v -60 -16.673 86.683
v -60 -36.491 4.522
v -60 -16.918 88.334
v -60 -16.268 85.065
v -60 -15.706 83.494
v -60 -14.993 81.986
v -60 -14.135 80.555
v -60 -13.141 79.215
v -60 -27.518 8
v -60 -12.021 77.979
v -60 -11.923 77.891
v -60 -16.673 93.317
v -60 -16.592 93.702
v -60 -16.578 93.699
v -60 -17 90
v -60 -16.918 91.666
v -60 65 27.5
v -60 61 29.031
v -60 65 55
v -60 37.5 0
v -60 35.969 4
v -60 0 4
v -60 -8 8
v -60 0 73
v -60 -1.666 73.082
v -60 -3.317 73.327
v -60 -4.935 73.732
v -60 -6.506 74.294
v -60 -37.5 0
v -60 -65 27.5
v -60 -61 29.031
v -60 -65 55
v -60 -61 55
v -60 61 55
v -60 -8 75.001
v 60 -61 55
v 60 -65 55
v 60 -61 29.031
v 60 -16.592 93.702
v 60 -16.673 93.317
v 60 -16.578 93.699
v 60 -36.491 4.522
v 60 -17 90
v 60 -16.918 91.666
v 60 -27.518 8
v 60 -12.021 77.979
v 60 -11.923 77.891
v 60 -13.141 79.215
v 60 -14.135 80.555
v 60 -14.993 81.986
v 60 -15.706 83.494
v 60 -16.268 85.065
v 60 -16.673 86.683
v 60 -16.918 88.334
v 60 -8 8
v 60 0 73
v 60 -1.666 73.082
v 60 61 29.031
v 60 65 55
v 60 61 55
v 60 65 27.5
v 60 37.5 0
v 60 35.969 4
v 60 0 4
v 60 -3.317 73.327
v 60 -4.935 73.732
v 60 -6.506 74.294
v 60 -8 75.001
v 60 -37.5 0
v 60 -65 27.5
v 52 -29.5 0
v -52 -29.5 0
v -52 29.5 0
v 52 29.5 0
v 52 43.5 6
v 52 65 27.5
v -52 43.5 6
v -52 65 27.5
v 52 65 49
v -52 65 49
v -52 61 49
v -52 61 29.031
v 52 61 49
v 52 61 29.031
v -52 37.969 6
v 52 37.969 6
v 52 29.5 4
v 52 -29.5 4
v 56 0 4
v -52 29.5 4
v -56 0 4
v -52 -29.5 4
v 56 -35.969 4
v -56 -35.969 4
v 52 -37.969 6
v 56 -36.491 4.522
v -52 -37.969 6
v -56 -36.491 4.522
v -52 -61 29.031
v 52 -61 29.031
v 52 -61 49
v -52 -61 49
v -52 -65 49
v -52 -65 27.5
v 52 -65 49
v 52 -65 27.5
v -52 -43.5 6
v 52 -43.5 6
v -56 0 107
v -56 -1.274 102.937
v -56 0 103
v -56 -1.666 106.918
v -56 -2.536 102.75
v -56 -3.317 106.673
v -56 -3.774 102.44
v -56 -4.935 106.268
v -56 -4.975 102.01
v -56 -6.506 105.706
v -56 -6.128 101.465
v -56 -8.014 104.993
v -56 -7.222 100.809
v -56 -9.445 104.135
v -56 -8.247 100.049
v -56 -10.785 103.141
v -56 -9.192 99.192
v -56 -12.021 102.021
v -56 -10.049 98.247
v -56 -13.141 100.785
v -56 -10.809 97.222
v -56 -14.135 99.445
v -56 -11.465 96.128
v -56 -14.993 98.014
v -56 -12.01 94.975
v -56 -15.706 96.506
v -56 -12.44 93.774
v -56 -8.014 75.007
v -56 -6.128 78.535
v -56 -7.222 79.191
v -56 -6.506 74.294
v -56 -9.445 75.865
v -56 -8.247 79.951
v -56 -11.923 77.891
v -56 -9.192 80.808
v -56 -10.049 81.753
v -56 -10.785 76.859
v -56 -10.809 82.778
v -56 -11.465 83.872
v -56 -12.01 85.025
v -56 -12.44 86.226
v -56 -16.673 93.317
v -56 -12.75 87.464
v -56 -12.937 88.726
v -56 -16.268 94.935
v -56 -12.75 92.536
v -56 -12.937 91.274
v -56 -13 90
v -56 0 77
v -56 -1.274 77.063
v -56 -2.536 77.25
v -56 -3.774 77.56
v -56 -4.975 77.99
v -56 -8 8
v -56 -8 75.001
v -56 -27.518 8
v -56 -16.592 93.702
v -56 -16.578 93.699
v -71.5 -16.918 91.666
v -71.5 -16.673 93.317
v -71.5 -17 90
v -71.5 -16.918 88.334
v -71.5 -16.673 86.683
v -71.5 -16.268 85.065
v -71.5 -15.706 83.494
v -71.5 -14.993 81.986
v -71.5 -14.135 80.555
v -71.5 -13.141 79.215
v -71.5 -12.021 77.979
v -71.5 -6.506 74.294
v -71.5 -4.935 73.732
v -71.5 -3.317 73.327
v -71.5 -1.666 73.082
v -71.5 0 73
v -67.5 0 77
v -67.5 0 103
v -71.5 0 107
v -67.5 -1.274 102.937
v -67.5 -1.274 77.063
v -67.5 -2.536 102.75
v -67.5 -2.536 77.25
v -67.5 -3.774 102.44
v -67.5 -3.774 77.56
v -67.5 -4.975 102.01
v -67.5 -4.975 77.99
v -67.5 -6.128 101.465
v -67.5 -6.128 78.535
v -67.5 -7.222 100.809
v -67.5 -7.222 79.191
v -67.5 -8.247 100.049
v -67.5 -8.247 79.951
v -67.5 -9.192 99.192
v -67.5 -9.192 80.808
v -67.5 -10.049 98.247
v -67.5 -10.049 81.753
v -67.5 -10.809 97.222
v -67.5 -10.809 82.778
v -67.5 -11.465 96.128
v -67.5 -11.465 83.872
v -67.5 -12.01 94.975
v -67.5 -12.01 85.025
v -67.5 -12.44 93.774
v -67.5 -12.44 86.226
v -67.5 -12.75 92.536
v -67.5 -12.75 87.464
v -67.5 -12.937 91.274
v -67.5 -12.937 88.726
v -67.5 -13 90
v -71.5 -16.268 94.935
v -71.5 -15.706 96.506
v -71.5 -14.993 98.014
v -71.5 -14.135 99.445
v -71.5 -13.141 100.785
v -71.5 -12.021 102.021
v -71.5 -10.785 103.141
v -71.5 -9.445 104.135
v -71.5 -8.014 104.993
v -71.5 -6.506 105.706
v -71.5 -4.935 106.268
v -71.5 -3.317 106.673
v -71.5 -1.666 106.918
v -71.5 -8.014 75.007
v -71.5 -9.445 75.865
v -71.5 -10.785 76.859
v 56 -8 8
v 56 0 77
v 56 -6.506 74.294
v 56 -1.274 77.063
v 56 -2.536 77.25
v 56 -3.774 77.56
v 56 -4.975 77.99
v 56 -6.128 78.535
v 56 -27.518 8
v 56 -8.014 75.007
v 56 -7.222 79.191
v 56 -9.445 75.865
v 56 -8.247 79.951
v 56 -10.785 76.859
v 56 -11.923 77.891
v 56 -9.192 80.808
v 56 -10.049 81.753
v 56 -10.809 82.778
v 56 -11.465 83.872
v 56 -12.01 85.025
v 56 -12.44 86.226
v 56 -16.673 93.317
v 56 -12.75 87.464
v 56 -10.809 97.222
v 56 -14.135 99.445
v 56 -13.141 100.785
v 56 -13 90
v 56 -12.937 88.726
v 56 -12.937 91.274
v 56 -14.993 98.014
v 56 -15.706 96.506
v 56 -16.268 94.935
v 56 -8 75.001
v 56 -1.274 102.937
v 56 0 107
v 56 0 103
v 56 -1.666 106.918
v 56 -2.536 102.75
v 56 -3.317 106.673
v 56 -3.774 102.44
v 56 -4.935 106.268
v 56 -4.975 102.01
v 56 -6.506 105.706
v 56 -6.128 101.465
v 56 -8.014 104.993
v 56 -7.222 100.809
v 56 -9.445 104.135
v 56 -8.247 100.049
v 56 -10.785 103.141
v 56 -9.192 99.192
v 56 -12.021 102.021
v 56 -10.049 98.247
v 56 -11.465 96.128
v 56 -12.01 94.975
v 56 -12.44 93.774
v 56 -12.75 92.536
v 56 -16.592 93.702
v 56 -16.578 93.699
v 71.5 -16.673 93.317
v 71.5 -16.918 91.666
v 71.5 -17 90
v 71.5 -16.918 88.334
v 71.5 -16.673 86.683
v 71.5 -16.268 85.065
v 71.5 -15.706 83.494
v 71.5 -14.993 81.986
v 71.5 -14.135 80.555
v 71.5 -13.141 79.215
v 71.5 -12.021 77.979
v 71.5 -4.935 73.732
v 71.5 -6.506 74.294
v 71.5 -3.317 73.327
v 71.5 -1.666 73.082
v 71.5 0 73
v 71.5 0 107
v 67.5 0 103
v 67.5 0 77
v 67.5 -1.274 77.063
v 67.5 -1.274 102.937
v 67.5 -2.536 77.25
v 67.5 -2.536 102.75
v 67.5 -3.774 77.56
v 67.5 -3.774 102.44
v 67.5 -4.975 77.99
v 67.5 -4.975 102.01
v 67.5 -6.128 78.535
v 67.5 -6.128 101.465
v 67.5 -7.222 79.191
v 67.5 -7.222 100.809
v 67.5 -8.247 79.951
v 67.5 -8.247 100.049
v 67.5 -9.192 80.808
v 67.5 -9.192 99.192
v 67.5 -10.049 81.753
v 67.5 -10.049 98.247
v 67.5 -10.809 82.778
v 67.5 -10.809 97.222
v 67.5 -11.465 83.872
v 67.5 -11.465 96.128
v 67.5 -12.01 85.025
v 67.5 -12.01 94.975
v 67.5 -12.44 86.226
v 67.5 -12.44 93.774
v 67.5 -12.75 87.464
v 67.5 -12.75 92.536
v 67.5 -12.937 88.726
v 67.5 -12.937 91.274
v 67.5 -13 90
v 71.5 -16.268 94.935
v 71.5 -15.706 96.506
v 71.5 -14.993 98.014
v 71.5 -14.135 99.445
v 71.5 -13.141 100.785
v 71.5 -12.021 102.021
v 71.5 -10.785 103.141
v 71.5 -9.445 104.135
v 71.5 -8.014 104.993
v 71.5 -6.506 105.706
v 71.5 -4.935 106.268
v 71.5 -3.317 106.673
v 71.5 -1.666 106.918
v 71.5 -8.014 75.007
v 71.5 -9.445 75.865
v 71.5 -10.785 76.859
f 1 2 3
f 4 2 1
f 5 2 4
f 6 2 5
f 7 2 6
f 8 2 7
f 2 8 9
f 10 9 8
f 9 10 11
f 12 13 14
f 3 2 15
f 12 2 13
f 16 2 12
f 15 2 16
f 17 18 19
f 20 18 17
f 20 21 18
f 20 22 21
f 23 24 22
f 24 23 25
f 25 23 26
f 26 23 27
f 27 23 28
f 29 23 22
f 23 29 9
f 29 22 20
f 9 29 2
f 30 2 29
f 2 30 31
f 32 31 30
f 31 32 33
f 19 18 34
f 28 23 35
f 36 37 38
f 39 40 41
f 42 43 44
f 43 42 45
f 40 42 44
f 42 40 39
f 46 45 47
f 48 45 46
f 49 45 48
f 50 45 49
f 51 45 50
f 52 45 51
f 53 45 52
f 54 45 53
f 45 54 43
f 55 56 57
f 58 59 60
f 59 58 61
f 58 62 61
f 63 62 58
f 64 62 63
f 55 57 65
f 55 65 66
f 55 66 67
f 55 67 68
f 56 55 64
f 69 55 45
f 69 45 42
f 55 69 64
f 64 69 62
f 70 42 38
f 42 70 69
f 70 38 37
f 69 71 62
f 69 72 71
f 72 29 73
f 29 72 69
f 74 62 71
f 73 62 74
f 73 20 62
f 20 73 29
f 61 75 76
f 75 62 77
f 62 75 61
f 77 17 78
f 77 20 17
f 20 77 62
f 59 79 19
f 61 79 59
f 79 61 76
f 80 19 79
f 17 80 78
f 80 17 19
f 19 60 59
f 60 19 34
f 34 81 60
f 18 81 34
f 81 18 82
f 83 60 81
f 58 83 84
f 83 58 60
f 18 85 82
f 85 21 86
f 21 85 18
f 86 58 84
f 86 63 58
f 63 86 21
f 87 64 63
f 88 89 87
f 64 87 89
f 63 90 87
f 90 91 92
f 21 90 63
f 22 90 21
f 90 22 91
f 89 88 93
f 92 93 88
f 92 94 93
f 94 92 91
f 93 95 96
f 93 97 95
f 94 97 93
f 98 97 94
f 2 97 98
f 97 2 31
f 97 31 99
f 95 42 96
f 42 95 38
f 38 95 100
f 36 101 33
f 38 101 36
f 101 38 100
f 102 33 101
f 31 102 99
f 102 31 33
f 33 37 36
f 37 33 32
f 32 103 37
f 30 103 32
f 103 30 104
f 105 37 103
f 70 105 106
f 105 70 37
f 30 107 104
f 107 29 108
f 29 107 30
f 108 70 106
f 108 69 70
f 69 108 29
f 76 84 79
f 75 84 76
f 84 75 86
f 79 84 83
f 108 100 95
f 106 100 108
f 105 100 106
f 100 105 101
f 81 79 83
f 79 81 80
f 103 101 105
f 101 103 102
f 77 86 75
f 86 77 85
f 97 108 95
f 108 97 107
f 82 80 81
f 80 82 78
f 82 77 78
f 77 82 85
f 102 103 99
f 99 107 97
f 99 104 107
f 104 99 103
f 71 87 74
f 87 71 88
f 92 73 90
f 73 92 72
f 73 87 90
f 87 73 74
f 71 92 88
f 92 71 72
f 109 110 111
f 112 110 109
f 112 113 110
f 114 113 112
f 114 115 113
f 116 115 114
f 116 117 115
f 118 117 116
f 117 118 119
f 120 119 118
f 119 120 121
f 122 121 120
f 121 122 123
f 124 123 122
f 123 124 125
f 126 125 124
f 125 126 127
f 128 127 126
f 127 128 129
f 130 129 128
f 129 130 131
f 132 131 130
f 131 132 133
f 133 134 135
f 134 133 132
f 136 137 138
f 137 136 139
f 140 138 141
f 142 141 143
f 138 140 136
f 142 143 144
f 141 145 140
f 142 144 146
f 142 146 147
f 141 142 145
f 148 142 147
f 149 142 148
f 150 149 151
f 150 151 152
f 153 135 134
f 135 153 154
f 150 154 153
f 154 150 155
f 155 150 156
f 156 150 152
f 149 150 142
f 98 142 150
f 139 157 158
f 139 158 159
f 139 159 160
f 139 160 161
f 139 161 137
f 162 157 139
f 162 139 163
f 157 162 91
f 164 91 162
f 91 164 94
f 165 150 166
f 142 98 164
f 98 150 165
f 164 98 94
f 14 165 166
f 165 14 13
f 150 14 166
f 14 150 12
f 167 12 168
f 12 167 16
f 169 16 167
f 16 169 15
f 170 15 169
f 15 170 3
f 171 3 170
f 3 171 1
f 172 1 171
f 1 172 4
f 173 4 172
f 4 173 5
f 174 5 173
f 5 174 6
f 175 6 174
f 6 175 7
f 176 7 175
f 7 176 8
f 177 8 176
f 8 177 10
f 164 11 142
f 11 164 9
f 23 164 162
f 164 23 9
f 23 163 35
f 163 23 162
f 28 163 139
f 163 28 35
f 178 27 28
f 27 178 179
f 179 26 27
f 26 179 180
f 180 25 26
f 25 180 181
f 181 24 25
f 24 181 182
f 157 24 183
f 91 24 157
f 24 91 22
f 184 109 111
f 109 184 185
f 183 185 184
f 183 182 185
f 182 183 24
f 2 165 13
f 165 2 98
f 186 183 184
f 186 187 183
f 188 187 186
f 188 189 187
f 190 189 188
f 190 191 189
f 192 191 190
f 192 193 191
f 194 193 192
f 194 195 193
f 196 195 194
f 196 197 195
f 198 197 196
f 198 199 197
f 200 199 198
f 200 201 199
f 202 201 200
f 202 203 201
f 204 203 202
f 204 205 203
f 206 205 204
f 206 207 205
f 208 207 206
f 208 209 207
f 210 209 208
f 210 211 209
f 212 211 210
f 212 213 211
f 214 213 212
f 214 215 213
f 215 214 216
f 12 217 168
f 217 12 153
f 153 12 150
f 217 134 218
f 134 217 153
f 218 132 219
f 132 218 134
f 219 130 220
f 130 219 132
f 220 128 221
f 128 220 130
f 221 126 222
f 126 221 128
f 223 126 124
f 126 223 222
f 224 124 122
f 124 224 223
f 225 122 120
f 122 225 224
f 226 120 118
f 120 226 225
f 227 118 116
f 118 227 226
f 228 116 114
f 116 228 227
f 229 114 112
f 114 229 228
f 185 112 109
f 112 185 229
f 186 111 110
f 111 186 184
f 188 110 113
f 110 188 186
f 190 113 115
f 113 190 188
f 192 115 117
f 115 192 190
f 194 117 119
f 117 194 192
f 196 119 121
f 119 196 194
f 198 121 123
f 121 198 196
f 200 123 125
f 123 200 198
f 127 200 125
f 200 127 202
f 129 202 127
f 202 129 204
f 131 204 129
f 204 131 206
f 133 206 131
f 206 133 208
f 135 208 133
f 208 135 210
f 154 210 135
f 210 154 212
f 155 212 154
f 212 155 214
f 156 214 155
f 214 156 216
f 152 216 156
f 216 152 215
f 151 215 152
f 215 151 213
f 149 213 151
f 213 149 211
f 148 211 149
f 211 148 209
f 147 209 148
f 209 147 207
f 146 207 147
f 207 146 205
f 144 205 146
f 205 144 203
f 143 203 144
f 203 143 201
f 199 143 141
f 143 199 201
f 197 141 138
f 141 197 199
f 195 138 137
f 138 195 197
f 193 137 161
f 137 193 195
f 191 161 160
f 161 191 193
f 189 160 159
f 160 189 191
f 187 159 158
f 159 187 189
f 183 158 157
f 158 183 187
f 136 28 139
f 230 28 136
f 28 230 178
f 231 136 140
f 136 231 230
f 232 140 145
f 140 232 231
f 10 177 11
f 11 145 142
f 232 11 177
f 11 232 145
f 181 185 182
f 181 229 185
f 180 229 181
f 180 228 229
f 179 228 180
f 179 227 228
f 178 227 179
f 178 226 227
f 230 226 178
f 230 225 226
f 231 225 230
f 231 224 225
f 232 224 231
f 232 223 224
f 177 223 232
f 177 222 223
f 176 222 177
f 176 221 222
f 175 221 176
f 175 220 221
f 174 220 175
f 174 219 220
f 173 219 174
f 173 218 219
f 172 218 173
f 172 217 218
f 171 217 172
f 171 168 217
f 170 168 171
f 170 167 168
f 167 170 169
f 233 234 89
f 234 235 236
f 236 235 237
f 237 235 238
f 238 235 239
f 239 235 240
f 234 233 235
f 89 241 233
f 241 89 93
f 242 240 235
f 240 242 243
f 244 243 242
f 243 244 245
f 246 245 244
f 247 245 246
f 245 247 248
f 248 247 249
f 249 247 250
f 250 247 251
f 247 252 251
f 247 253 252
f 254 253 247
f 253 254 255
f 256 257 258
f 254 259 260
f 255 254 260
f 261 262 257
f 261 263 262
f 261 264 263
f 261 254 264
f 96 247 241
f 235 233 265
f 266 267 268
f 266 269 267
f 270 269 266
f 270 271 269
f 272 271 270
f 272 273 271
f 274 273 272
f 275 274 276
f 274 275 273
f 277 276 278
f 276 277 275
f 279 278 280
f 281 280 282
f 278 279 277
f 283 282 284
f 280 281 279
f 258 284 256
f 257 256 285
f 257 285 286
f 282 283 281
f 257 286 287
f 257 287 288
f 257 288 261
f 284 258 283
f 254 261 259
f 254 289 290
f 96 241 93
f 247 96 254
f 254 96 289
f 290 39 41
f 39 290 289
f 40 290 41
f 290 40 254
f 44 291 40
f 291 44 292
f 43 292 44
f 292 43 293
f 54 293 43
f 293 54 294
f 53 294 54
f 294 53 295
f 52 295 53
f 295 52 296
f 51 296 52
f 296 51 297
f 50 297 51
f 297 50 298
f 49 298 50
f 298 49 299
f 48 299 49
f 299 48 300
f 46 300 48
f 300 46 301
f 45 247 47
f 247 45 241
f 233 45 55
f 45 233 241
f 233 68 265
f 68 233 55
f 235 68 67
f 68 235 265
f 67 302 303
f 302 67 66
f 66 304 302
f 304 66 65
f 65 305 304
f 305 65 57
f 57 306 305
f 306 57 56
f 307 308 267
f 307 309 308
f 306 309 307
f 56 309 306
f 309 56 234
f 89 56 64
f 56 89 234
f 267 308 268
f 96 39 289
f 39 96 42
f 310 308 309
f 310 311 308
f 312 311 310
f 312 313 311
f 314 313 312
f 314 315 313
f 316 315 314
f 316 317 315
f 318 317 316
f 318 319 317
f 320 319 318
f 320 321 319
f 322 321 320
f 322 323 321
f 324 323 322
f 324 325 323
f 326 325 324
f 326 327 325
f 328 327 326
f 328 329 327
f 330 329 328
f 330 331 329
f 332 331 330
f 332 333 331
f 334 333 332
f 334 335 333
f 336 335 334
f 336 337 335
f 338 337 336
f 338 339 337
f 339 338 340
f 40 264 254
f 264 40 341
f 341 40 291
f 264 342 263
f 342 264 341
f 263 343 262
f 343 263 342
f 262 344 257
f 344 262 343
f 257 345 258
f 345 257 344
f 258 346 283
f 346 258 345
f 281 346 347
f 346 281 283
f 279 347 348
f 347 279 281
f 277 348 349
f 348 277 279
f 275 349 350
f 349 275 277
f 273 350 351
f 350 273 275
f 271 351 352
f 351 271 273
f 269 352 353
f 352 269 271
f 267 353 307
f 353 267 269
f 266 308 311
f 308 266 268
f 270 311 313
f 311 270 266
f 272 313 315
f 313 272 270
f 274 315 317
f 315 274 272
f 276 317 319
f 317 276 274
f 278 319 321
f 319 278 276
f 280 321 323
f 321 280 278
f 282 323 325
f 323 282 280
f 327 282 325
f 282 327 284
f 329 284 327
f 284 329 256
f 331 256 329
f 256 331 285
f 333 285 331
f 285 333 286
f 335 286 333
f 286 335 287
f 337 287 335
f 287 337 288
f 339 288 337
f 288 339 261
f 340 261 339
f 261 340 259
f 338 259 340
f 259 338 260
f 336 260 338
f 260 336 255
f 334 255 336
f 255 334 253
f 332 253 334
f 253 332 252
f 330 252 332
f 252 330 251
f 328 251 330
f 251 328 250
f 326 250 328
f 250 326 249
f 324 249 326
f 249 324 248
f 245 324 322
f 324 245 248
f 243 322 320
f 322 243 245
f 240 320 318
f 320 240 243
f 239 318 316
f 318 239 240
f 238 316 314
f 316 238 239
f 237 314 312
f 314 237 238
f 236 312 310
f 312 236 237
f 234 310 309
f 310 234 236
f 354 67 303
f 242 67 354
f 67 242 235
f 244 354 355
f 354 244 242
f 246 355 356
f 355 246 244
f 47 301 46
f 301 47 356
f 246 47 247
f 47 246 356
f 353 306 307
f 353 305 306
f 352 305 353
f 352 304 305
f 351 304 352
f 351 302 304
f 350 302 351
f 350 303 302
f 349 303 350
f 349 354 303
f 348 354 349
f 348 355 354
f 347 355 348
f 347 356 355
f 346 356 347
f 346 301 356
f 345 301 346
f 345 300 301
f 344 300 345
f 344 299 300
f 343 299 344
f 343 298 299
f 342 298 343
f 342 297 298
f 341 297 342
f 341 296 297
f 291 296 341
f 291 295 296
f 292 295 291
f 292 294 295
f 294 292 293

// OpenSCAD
/*
 * CC BY-NC 4.0
 * https://creativecommons.org/licenses/by-nc/4.0/
 *
 * Author: Kevin Lam (kevinlam@bbs2.hk)
 *
 */

/* setup */
part = "holder"; // [holder: Holder, bar: Bar holding the roll]

width = 120;
height = 130;

// excluding the arms
depth = 55;

// this affect the strength of the frame
thickness = 4;
// this affect the width at the sides of the frame
padding = 8;

// Distance from the bar to the back, i.e., arm length
bar_z = 90;

// this is the width of the bar holding the roll
bar_width = 135;    
bar_diameter = 26;  // diameter of bar


module back() {
    corner = thickness*cos(135/2);
    
    difference() {
        translate([-width/2,0,depth])
        rotate(90,[0,1,0])
        linear_extrude(width)
        polygon([
            [0,height/2],
            [depth/2, height/2],
            [depth, (height-depth)/2],
            [depth, -(height-depth)/2],
            [depth/2, -height/2],
            [0,-height/2],
            [0,-height/2+thickness],
            [depth/2-corner, -height/2+thickness],
            [depth-thickness, -(height-depth)/2+corner],
            [depth-thickness, (height-depth)/2-corner],
            [depth/2-corner, height/2-thickness],
            [0,height/2-thickness]
        ]);
        translate([0, 0, (depth-padding)/2+thickness])
            cube([width-padding*2,height*2,depth-padding-thickness], center=true);
        cube([width-padding*2, (height-depth)-padding*2, thickness*4], center=true);
    }
}

module holder_arm_outer(arm_height, hyp, tang, arm_angle) {

    polygon([
        [0,-arm_height/2],
        [tang * sin(arm_angle), -arm_height/2+tang*cos(arm_angle)],
        [bar_z, 0],
        [bar_z/2, 0],
        [0,0]
    ]);
    
}


module holder_arm_inner(arm_height, hyp, tang, arm_angle) {

    upperangle = atan2(bar_z, arm_height);
    polygon([
        [padding, -arm_height/2+padding/tan(arm_angle)+padding/sin(arm_angle) ],
        [(arm_height/2-padding-padding/sin(arm_angle))*tan(arm_angle), -padding],
    [padding,-padding],
        [(arm_height/2+padding-padding/sin(arm_angle))/arm_height*bar_z, -padding],
        [padding, -padding]
    ]);
    
}

module holder_ring(arm_height, arm_angle) {
    translate([bar_z, 0, 0]) {
        difference() {
            circle(bar_diameter/2+thickness);
            circle(bar_diameter/2);
            translate([-bar_diameter/2-thickness,0,0])
                square(bar_diameter+thickness*2);
        }
    }
}

module holder_ring_outer() {
    translate([bar_z, 0, 0]) {
        difference() {
            circle(bar_diameter/2+thickness);
        }
        translate([-bar_diameter/2-thickness,0,0])
            square([bar_diameter+thickness*2, bar_diameter+thickness*2]);
    }
}

module holder_arm() {
    
    arm_height = (height-depth);
    hyp = sqrt(pow(arm_height/2,2) + bar_z*bar_z);
    hyp_angle = atan2(bar_z, arm_height/2);
    
    tang = sqrt(hyp*hyp - pow(bar_diameter/2+thickness,2));
    arm_angle = atan2(bar_z, arm_height/2) + acos(tang/hyp);

    linear_extrude(thickness) {
        difference() {
            holder_arm_outer(arm_height, hyp, tang, arm_angle);
            holder_arm_inner(arm_height, hyp, tang, arm_angle);
            
            holder_ring_outer();
        }
    }

    
    linear_extrude(bar_width/2-width/2+thickness) {
        holder_ring(arm_height,arm_angle);
    }
    
    
    translate([bar_z, 0, bar_width/2-width/2+thickness])
        linear_extrude(thickness) {
            difference() {
                circle(bar_diameter/2+thickness);
                translate([-bar_diameter,0,0])
                    square(bar_diameter*2);
            }
        }

}

module holder() {
    back();

    translate([-width/2+1*thickness,0,0])
        rotate(-90,[0,1,0]) {
            holder_arm();
        }

    translate([width/2-1*thickness,0,0])
        mirror([1,0,0])
        rotate(-90,[0,1,0])
           holder_arm();
}

module bar() {
    cylinder(bar_width/2, bar_diameter/2, bar_diameter/2*0.9);
    translate([0,0,bar_width])
    rotate(180, [0,1,0])
        cylinder(bar_width/2, bar_diameter/2, bar_diameter/2*0.9);
}


// I like it this way :D
$fn = 64;

print_part();

module print_part() {
	if (part == "holder") {
        holder();
	} else if (part == "bar") {
        bar();
	}
}
